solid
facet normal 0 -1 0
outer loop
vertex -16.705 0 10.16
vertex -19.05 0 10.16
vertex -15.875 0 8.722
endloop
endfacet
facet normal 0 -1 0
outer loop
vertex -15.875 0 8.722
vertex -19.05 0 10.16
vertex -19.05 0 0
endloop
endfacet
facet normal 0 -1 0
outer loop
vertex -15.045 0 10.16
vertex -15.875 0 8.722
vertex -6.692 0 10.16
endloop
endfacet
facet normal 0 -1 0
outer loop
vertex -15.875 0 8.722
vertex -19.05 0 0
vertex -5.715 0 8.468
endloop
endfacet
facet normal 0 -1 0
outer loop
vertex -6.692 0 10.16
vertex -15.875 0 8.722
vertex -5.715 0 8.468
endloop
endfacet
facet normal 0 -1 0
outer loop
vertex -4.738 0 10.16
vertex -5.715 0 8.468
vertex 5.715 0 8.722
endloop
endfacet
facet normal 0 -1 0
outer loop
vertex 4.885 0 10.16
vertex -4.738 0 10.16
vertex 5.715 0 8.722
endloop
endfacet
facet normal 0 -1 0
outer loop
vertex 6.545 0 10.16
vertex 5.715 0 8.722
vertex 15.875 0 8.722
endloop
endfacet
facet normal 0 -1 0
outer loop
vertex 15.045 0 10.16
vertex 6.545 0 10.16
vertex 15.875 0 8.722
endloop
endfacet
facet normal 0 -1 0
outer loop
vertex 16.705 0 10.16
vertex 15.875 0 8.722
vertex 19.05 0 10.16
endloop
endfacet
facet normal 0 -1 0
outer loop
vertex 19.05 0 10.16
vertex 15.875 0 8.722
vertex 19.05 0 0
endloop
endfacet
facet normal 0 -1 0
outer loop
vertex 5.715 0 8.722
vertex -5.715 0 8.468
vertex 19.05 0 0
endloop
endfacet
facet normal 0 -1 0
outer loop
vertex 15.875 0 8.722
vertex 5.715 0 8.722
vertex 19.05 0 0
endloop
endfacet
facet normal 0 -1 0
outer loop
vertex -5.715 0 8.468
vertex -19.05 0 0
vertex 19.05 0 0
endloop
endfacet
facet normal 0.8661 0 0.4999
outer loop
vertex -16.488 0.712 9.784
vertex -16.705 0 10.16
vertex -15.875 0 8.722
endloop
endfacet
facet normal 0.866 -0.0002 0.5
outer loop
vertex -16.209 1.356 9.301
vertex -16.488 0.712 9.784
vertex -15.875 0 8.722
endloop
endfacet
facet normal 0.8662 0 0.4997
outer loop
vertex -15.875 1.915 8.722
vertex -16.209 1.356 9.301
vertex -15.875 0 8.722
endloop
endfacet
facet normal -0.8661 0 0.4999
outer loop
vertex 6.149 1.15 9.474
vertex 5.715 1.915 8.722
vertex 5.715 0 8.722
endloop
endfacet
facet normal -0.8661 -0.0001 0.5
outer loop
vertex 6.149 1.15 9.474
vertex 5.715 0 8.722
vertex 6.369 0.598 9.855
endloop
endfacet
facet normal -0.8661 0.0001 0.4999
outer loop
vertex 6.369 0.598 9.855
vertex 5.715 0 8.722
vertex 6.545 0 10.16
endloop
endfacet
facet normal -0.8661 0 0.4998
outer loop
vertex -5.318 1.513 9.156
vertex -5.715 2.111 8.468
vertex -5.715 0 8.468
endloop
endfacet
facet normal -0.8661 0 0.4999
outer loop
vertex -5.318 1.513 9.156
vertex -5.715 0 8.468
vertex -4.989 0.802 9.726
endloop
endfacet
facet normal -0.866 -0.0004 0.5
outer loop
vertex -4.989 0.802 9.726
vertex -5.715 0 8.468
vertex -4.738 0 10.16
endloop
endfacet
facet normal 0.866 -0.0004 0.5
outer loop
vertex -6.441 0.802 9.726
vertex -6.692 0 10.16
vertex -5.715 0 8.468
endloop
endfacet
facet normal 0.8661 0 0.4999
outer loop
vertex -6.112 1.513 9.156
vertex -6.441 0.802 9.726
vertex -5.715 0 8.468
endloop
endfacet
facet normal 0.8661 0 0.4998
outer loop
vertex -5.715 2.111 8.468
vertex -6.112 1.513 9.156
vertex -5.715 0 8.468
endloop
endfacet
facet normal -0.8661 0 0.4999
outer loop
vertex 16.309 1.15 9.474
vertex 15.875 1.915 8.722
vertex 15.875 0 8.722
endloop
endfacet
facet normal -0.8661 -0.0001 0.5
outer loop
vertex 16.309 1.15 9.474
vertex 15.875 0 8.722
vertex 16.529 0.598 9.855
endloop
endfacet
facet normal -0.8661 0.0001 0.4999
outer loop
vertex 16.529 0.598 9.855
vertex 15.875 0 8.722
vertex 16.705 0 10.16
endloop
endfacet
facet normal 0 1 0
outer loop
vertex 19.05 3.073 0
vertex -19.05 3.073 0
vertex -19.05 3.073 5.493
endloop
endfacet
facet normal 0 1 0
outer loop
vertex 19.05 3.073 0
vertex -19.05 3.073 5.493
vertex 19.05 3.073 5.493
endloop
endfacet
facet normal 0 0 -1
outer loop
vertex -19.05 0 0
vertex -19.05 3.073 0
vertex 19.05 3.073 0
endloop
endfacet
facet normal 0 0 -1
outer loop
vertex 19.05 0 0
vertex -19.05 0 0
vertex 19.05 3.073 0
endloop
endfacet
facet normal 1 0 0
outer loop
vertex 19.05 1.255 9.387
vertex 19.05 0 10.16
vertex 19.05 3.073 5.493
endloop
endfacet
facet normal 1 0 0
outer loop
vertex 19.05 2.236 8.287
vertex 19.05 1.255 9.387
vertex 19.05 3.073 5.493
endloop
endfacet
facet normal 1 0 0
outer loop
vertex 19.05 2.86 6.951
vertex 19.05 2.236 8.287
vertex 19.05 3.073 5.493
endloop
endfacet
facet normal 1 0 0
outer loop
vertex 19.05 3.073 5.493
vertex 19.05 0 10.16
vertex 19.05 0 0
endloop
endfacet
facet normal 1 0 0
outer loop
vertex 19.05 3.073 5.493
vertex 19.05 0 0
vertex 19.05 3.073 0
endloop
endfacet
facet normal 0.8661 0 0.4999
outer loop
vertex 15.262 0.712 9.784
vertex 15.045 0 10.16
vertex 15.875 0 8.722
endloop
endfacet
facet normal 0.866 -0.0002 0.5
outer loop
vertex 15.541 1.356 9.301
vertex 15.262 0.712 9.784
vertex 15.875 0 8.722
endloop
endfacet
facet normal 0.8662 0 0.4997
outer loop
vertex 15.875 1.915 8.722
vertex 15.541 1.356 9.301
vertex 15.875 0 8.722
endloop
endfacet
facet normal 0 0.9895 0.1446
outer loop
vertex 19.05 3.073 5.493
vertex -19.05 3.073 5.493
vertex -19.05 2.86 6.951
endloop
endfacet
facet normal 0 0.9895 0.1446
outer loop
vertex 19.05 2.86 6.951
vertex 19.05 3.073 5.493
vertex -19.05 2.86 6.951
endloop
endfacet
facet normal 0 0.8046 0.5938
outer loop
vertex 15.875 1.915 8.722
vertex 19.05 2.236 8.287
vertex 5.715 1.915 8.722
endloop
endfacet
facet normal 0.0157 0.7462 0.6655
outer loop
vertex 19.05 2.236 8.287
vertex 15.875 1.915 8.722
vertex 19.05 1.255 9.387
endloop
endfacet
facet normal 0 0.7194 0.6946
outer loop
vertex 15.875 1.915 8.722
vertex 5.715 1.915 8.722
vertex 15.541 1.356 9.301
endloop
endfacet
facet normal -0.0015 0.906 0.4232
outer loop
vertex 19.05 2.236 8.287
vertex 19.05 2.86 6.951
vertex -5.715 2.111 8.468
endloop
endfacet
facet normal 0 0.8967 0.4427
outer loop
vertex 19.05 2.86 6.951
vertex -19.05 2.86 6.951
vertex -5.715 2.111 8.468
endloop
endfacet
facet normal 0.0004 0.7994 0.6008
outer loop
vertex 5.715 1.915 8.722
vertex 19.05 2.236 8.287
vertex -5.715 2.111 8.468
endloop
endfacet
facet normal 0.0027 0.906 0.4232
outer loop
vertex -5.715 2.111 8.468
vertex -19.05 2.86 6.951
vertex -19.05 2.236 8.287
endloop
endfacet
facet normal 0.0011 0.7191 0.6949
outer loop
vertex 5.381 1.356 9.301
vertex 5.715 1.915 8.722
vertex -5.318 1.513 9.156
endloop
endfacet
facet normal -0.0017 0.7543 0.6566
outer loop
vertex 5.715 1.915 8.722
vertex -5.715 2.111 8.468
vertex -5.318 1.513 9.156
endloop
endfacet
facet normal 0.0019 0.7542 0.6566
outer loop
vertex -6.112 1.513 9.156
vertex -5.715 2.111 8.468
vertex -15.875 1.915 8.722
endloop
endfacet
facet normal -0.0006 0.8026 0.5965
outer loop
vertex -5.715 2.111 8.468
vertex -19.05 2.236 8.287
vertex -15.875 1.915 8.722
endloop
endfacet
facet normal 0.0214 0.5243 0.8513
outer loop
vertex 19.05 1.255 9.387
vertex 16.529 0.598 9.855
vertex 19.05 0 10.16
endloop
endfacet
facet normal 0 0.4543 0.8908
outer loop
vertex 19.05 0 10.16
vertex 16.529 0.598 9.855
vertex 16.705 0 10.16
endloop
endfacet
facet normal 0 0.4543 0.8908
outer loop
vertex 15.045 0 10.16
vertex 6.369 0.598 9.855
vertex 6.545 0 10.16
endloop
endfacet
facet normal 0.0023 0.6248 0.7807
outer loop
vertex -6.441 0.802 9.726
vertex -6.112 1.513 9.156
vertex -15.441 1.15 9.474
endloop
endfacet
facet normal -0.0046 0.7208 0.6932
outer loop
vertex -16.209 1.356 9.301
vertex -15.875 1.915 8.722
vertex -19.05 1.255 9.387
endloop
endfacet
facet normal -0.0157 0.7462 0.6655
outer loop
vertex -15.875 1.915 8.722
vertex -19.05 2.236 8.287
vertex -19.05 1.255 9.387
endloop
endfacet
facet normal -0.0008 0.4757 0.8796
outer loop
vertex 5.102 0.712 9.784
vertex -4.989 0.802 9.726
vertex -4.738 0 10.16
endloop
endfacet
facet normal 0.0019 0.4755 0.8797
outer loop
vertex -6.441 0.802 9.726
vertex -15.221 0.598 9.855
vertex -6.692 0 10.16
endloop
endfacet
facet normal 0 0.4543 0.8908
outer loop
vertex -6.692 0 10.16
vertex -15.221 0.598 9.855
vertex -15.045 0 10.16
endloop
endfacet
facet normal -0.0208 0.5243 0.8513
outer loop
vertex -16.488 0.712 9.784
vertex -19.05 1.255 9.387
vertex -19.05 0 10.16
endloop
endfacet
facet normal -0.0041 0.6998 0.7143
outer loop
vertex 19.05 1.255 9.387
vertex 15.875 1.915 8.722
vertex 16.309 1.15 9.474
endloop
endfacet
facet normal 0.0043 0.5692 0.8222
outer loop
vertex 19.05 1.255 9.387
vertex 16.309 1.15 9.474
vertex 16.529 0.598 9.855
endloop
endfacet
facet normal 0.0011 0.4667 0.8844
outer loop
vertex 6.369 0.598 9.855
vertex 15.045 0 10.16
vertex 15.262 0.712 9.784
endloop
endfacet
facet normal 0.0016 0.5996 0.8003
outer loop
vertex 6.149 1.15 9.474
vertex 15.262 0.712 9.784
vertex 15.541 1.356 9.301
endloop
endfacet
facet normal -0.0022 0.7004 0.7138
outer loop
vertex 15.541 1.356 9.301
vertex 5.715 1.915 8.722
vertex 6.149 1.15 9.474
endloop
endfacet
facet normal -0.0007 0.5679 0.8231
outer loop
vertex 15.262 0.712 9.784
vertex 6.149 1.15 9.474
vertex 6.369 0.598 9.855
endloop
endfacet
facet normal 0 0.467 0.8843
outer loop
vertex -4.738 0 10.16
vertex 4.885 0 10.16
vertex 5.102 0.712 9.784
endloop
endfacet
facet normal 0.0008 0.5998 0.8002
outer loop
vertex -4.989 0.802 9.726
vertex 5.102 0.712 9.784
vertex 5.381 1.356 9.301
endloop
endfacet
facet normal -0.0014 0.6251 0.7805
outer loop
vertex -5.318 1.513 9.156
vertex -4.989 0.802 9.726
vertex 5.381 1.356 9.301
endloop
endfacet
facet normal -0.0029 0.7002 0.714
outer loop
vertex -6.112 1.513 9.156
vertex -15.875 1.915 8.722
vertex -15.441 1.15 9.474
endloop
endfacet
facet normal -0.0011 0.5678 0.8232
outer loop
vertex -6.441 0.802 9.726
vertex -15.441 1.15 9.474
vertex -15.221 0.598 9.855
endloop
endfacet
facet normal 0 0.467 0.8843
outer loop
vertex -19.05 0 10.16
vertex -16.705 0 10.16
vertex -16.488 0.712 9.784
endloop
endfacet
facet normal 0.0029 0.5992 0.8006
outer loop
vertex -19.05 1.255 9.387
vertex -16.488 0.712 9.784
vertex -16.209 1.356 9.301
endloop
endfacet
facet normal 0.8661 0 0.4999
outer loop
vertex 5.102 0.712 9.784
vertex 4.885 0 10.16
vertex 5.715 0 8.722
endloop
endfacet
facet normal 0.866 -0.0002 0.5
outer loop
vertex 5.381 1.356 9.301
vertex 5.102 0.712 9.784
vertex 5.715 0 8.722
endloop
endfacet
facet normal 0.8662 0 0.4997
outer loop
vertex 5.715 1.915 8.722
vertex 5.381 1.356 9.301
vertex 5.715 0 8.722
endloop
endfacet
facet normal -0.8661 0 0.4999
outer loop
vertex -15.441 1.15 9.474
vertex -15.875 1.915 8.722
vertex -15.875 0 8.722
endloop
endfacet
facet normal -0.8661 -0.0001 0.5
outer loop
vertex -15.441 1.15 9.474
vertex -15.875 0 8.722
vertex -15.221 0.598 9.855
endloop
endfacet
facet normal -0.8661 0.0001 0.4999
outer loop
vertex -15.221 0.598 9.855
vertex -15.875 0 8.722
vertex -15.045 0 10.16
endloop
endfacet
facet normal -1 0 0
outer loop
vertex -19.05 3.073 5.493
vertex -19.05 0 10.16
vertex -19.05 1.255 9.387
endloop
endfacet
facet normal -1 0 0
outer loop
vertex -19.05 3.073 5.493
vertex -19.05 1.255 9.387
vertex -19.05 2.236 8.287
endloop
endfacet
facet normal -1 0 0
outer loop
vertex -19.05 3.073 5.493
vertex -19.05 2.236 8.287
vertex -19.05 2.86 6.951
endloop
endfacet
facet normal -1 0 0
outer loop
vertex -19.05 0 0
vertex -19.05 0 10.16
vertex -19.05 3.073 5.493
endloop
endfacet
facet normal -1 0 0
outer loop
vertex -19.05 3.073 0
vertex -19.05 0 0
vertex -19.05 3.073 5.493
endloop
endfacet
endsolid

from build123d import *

# Parameters (mm, degrees)
F0_W        = 38.1
F0_H        = 3.0734
F1_DEPTH    = 10.16
F3_T1_DEPTH = 61.4345004446
F4_DEPTH    = 25.4


# Not quite as in the source:
# - a fillet or chamfer that OpenCascade refuses, or shapes differently, is made with other operations: its cross-section is extruded or revolved along the edge and cut away or added


with BuildPart() as f1:
    # F0 (on Top) → F1 (new body)
    with BuildSketch(Plane.XY):
        with Locations((0, 1.5367)):
            Rectangle(F0_W, F0_H)
    extrude(amount=F1_DEPTH)

    # F3: fillet of radius 5.08 on 1 edges, made by hand

    # F3_s2 → F3_t1 (cut)
    with BuildSketch(Plane.YZ.offset(-30.7172502223)):
        with BuildLine():
            ThreePointArc((3.0734, 5.4930999111), (2.2360364445, 8.2870999111), (0, 10.16))
            Line((0, 10.16), (3.0734, 10.16))
            Line((3.0734, 10.16), (3.0734, 5.4930999111))
        make_face()
    extrude(amount=F3_T1_DEPTH, mode=Mode.SUBTRACT)

    # F2 (on face) → F4 (cut)
    with BuildSketch(Plane.XZ):
        Polygon((-15.875, 8.7222954744), (-15.0449409051, 10.16), (-16.7050590949, 10.16), align=None)
        Polygon((-4.7382939367, 10.16), (-6.6917060633, 10.16), (-5.715, 8.4682954744), align=None)
        Polygon((6.5450590949, 10.16), (4.8849409051, 10.16), (5.715, 8.7222954744), align=None)
        Polygon((16.7050590949, 10.16), (15.0449409051, 10.16), (15.875, 8.7222954744), align=None)
    extrude(amount=-F4_DEPTH, mode=Mode.SUBTRACT)


solid = f1.part
